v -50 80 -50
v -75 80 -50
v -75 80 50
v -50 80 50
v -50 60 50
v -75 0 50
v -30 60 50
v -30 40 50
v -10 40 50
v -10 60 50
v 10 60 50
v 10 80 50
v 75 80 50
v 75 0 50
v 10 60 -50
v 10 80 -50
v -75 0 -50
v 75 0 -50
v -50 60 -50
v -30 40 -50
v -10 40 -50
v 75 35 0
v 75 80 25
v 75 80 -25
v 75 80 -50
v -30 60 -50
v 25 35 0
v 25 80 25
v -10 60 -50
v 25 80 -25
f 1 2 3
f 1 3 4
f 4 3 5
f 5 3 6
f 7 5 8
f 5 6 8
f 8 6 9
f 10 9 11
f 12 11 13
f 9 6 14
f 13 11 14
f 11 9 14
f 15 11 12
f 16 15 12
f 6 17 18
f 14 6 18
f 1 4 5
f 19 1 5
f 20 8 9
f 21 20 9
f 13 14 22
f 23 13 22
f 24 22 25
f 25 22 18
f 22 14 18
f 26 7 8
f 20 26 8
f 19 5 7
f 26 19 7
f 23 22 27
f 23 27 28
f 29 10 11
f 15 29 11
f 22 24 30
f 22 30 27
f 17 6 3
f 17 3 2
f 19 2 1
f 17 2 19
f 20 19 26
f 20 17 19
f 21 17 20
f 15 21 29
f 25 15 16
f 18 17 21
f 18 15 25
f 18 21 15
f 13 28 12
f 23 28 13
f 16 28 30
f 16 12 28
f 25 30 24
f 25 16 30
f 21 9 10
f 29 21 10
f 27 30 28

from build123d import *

# Parameters (mm, degrees)
SKETCH1_W               = 150
SKETCH1_H               = 100
BOSS_EXTRUDE1_DEPTH     = 80
CUT_EXTRUDE1_DEPTH      = 50
CUT_EXTRUDE2_DEPTH      = 1
CUT_EXTRUDE2_DEPTH_BACK = 101


with BuildPart() as part:
    # Sketch1 → Boss-Extrude1 (new body)
    with BuildSketch(Plane(origin=(0, 0, 0), x_dir=(1, 0, 0), z_dir=(0, 1, 0))):
        Rectangle(SKETCH1_W, SKETCH1_H)
    extrude(amount=BOSS_EXTRUDE1_DEPTH)

    # Sketch2 → Cut-Extrude1 (cut)
    with BuildSketch(Plane(origin=(75, 0, 0), x_dir=(0, 0, -1), z_dir=(1, 0, 0))):
        Polygon((-25, 80), (25, 80), (0, 35), align=None)
    extrude(amount=-CUT_EXTRUDE1_DEPTH, mode=Mode.SUBTRACT)

    # Sketch3 → Cut-Extrude2 (cut, two sides)
    with BuildSketch(Plane.XY.offset(50)) as cut_extrude2_sk:
        Polygon((-425, 80), (-75, 80), (-50, 80), (-50, 60), (-30, 60), (-30, 40), (-10, 40), (-10, 60), (10, 60), (10, 80), (10, 430), (-428.813790469, 975.382853869), (-863.813790469, 625.382853869), align=None)
    extrude(amount=CUT_EXTRUDE2_DEPTH, mode=Mode.SUBTRACT)
    extrude(cut_extrude2_sk.sketch, amount=-CUT_EXTRUDE2_DEPTH_BACK, mode=Mode.SUBTRACT)


solid = part.part
